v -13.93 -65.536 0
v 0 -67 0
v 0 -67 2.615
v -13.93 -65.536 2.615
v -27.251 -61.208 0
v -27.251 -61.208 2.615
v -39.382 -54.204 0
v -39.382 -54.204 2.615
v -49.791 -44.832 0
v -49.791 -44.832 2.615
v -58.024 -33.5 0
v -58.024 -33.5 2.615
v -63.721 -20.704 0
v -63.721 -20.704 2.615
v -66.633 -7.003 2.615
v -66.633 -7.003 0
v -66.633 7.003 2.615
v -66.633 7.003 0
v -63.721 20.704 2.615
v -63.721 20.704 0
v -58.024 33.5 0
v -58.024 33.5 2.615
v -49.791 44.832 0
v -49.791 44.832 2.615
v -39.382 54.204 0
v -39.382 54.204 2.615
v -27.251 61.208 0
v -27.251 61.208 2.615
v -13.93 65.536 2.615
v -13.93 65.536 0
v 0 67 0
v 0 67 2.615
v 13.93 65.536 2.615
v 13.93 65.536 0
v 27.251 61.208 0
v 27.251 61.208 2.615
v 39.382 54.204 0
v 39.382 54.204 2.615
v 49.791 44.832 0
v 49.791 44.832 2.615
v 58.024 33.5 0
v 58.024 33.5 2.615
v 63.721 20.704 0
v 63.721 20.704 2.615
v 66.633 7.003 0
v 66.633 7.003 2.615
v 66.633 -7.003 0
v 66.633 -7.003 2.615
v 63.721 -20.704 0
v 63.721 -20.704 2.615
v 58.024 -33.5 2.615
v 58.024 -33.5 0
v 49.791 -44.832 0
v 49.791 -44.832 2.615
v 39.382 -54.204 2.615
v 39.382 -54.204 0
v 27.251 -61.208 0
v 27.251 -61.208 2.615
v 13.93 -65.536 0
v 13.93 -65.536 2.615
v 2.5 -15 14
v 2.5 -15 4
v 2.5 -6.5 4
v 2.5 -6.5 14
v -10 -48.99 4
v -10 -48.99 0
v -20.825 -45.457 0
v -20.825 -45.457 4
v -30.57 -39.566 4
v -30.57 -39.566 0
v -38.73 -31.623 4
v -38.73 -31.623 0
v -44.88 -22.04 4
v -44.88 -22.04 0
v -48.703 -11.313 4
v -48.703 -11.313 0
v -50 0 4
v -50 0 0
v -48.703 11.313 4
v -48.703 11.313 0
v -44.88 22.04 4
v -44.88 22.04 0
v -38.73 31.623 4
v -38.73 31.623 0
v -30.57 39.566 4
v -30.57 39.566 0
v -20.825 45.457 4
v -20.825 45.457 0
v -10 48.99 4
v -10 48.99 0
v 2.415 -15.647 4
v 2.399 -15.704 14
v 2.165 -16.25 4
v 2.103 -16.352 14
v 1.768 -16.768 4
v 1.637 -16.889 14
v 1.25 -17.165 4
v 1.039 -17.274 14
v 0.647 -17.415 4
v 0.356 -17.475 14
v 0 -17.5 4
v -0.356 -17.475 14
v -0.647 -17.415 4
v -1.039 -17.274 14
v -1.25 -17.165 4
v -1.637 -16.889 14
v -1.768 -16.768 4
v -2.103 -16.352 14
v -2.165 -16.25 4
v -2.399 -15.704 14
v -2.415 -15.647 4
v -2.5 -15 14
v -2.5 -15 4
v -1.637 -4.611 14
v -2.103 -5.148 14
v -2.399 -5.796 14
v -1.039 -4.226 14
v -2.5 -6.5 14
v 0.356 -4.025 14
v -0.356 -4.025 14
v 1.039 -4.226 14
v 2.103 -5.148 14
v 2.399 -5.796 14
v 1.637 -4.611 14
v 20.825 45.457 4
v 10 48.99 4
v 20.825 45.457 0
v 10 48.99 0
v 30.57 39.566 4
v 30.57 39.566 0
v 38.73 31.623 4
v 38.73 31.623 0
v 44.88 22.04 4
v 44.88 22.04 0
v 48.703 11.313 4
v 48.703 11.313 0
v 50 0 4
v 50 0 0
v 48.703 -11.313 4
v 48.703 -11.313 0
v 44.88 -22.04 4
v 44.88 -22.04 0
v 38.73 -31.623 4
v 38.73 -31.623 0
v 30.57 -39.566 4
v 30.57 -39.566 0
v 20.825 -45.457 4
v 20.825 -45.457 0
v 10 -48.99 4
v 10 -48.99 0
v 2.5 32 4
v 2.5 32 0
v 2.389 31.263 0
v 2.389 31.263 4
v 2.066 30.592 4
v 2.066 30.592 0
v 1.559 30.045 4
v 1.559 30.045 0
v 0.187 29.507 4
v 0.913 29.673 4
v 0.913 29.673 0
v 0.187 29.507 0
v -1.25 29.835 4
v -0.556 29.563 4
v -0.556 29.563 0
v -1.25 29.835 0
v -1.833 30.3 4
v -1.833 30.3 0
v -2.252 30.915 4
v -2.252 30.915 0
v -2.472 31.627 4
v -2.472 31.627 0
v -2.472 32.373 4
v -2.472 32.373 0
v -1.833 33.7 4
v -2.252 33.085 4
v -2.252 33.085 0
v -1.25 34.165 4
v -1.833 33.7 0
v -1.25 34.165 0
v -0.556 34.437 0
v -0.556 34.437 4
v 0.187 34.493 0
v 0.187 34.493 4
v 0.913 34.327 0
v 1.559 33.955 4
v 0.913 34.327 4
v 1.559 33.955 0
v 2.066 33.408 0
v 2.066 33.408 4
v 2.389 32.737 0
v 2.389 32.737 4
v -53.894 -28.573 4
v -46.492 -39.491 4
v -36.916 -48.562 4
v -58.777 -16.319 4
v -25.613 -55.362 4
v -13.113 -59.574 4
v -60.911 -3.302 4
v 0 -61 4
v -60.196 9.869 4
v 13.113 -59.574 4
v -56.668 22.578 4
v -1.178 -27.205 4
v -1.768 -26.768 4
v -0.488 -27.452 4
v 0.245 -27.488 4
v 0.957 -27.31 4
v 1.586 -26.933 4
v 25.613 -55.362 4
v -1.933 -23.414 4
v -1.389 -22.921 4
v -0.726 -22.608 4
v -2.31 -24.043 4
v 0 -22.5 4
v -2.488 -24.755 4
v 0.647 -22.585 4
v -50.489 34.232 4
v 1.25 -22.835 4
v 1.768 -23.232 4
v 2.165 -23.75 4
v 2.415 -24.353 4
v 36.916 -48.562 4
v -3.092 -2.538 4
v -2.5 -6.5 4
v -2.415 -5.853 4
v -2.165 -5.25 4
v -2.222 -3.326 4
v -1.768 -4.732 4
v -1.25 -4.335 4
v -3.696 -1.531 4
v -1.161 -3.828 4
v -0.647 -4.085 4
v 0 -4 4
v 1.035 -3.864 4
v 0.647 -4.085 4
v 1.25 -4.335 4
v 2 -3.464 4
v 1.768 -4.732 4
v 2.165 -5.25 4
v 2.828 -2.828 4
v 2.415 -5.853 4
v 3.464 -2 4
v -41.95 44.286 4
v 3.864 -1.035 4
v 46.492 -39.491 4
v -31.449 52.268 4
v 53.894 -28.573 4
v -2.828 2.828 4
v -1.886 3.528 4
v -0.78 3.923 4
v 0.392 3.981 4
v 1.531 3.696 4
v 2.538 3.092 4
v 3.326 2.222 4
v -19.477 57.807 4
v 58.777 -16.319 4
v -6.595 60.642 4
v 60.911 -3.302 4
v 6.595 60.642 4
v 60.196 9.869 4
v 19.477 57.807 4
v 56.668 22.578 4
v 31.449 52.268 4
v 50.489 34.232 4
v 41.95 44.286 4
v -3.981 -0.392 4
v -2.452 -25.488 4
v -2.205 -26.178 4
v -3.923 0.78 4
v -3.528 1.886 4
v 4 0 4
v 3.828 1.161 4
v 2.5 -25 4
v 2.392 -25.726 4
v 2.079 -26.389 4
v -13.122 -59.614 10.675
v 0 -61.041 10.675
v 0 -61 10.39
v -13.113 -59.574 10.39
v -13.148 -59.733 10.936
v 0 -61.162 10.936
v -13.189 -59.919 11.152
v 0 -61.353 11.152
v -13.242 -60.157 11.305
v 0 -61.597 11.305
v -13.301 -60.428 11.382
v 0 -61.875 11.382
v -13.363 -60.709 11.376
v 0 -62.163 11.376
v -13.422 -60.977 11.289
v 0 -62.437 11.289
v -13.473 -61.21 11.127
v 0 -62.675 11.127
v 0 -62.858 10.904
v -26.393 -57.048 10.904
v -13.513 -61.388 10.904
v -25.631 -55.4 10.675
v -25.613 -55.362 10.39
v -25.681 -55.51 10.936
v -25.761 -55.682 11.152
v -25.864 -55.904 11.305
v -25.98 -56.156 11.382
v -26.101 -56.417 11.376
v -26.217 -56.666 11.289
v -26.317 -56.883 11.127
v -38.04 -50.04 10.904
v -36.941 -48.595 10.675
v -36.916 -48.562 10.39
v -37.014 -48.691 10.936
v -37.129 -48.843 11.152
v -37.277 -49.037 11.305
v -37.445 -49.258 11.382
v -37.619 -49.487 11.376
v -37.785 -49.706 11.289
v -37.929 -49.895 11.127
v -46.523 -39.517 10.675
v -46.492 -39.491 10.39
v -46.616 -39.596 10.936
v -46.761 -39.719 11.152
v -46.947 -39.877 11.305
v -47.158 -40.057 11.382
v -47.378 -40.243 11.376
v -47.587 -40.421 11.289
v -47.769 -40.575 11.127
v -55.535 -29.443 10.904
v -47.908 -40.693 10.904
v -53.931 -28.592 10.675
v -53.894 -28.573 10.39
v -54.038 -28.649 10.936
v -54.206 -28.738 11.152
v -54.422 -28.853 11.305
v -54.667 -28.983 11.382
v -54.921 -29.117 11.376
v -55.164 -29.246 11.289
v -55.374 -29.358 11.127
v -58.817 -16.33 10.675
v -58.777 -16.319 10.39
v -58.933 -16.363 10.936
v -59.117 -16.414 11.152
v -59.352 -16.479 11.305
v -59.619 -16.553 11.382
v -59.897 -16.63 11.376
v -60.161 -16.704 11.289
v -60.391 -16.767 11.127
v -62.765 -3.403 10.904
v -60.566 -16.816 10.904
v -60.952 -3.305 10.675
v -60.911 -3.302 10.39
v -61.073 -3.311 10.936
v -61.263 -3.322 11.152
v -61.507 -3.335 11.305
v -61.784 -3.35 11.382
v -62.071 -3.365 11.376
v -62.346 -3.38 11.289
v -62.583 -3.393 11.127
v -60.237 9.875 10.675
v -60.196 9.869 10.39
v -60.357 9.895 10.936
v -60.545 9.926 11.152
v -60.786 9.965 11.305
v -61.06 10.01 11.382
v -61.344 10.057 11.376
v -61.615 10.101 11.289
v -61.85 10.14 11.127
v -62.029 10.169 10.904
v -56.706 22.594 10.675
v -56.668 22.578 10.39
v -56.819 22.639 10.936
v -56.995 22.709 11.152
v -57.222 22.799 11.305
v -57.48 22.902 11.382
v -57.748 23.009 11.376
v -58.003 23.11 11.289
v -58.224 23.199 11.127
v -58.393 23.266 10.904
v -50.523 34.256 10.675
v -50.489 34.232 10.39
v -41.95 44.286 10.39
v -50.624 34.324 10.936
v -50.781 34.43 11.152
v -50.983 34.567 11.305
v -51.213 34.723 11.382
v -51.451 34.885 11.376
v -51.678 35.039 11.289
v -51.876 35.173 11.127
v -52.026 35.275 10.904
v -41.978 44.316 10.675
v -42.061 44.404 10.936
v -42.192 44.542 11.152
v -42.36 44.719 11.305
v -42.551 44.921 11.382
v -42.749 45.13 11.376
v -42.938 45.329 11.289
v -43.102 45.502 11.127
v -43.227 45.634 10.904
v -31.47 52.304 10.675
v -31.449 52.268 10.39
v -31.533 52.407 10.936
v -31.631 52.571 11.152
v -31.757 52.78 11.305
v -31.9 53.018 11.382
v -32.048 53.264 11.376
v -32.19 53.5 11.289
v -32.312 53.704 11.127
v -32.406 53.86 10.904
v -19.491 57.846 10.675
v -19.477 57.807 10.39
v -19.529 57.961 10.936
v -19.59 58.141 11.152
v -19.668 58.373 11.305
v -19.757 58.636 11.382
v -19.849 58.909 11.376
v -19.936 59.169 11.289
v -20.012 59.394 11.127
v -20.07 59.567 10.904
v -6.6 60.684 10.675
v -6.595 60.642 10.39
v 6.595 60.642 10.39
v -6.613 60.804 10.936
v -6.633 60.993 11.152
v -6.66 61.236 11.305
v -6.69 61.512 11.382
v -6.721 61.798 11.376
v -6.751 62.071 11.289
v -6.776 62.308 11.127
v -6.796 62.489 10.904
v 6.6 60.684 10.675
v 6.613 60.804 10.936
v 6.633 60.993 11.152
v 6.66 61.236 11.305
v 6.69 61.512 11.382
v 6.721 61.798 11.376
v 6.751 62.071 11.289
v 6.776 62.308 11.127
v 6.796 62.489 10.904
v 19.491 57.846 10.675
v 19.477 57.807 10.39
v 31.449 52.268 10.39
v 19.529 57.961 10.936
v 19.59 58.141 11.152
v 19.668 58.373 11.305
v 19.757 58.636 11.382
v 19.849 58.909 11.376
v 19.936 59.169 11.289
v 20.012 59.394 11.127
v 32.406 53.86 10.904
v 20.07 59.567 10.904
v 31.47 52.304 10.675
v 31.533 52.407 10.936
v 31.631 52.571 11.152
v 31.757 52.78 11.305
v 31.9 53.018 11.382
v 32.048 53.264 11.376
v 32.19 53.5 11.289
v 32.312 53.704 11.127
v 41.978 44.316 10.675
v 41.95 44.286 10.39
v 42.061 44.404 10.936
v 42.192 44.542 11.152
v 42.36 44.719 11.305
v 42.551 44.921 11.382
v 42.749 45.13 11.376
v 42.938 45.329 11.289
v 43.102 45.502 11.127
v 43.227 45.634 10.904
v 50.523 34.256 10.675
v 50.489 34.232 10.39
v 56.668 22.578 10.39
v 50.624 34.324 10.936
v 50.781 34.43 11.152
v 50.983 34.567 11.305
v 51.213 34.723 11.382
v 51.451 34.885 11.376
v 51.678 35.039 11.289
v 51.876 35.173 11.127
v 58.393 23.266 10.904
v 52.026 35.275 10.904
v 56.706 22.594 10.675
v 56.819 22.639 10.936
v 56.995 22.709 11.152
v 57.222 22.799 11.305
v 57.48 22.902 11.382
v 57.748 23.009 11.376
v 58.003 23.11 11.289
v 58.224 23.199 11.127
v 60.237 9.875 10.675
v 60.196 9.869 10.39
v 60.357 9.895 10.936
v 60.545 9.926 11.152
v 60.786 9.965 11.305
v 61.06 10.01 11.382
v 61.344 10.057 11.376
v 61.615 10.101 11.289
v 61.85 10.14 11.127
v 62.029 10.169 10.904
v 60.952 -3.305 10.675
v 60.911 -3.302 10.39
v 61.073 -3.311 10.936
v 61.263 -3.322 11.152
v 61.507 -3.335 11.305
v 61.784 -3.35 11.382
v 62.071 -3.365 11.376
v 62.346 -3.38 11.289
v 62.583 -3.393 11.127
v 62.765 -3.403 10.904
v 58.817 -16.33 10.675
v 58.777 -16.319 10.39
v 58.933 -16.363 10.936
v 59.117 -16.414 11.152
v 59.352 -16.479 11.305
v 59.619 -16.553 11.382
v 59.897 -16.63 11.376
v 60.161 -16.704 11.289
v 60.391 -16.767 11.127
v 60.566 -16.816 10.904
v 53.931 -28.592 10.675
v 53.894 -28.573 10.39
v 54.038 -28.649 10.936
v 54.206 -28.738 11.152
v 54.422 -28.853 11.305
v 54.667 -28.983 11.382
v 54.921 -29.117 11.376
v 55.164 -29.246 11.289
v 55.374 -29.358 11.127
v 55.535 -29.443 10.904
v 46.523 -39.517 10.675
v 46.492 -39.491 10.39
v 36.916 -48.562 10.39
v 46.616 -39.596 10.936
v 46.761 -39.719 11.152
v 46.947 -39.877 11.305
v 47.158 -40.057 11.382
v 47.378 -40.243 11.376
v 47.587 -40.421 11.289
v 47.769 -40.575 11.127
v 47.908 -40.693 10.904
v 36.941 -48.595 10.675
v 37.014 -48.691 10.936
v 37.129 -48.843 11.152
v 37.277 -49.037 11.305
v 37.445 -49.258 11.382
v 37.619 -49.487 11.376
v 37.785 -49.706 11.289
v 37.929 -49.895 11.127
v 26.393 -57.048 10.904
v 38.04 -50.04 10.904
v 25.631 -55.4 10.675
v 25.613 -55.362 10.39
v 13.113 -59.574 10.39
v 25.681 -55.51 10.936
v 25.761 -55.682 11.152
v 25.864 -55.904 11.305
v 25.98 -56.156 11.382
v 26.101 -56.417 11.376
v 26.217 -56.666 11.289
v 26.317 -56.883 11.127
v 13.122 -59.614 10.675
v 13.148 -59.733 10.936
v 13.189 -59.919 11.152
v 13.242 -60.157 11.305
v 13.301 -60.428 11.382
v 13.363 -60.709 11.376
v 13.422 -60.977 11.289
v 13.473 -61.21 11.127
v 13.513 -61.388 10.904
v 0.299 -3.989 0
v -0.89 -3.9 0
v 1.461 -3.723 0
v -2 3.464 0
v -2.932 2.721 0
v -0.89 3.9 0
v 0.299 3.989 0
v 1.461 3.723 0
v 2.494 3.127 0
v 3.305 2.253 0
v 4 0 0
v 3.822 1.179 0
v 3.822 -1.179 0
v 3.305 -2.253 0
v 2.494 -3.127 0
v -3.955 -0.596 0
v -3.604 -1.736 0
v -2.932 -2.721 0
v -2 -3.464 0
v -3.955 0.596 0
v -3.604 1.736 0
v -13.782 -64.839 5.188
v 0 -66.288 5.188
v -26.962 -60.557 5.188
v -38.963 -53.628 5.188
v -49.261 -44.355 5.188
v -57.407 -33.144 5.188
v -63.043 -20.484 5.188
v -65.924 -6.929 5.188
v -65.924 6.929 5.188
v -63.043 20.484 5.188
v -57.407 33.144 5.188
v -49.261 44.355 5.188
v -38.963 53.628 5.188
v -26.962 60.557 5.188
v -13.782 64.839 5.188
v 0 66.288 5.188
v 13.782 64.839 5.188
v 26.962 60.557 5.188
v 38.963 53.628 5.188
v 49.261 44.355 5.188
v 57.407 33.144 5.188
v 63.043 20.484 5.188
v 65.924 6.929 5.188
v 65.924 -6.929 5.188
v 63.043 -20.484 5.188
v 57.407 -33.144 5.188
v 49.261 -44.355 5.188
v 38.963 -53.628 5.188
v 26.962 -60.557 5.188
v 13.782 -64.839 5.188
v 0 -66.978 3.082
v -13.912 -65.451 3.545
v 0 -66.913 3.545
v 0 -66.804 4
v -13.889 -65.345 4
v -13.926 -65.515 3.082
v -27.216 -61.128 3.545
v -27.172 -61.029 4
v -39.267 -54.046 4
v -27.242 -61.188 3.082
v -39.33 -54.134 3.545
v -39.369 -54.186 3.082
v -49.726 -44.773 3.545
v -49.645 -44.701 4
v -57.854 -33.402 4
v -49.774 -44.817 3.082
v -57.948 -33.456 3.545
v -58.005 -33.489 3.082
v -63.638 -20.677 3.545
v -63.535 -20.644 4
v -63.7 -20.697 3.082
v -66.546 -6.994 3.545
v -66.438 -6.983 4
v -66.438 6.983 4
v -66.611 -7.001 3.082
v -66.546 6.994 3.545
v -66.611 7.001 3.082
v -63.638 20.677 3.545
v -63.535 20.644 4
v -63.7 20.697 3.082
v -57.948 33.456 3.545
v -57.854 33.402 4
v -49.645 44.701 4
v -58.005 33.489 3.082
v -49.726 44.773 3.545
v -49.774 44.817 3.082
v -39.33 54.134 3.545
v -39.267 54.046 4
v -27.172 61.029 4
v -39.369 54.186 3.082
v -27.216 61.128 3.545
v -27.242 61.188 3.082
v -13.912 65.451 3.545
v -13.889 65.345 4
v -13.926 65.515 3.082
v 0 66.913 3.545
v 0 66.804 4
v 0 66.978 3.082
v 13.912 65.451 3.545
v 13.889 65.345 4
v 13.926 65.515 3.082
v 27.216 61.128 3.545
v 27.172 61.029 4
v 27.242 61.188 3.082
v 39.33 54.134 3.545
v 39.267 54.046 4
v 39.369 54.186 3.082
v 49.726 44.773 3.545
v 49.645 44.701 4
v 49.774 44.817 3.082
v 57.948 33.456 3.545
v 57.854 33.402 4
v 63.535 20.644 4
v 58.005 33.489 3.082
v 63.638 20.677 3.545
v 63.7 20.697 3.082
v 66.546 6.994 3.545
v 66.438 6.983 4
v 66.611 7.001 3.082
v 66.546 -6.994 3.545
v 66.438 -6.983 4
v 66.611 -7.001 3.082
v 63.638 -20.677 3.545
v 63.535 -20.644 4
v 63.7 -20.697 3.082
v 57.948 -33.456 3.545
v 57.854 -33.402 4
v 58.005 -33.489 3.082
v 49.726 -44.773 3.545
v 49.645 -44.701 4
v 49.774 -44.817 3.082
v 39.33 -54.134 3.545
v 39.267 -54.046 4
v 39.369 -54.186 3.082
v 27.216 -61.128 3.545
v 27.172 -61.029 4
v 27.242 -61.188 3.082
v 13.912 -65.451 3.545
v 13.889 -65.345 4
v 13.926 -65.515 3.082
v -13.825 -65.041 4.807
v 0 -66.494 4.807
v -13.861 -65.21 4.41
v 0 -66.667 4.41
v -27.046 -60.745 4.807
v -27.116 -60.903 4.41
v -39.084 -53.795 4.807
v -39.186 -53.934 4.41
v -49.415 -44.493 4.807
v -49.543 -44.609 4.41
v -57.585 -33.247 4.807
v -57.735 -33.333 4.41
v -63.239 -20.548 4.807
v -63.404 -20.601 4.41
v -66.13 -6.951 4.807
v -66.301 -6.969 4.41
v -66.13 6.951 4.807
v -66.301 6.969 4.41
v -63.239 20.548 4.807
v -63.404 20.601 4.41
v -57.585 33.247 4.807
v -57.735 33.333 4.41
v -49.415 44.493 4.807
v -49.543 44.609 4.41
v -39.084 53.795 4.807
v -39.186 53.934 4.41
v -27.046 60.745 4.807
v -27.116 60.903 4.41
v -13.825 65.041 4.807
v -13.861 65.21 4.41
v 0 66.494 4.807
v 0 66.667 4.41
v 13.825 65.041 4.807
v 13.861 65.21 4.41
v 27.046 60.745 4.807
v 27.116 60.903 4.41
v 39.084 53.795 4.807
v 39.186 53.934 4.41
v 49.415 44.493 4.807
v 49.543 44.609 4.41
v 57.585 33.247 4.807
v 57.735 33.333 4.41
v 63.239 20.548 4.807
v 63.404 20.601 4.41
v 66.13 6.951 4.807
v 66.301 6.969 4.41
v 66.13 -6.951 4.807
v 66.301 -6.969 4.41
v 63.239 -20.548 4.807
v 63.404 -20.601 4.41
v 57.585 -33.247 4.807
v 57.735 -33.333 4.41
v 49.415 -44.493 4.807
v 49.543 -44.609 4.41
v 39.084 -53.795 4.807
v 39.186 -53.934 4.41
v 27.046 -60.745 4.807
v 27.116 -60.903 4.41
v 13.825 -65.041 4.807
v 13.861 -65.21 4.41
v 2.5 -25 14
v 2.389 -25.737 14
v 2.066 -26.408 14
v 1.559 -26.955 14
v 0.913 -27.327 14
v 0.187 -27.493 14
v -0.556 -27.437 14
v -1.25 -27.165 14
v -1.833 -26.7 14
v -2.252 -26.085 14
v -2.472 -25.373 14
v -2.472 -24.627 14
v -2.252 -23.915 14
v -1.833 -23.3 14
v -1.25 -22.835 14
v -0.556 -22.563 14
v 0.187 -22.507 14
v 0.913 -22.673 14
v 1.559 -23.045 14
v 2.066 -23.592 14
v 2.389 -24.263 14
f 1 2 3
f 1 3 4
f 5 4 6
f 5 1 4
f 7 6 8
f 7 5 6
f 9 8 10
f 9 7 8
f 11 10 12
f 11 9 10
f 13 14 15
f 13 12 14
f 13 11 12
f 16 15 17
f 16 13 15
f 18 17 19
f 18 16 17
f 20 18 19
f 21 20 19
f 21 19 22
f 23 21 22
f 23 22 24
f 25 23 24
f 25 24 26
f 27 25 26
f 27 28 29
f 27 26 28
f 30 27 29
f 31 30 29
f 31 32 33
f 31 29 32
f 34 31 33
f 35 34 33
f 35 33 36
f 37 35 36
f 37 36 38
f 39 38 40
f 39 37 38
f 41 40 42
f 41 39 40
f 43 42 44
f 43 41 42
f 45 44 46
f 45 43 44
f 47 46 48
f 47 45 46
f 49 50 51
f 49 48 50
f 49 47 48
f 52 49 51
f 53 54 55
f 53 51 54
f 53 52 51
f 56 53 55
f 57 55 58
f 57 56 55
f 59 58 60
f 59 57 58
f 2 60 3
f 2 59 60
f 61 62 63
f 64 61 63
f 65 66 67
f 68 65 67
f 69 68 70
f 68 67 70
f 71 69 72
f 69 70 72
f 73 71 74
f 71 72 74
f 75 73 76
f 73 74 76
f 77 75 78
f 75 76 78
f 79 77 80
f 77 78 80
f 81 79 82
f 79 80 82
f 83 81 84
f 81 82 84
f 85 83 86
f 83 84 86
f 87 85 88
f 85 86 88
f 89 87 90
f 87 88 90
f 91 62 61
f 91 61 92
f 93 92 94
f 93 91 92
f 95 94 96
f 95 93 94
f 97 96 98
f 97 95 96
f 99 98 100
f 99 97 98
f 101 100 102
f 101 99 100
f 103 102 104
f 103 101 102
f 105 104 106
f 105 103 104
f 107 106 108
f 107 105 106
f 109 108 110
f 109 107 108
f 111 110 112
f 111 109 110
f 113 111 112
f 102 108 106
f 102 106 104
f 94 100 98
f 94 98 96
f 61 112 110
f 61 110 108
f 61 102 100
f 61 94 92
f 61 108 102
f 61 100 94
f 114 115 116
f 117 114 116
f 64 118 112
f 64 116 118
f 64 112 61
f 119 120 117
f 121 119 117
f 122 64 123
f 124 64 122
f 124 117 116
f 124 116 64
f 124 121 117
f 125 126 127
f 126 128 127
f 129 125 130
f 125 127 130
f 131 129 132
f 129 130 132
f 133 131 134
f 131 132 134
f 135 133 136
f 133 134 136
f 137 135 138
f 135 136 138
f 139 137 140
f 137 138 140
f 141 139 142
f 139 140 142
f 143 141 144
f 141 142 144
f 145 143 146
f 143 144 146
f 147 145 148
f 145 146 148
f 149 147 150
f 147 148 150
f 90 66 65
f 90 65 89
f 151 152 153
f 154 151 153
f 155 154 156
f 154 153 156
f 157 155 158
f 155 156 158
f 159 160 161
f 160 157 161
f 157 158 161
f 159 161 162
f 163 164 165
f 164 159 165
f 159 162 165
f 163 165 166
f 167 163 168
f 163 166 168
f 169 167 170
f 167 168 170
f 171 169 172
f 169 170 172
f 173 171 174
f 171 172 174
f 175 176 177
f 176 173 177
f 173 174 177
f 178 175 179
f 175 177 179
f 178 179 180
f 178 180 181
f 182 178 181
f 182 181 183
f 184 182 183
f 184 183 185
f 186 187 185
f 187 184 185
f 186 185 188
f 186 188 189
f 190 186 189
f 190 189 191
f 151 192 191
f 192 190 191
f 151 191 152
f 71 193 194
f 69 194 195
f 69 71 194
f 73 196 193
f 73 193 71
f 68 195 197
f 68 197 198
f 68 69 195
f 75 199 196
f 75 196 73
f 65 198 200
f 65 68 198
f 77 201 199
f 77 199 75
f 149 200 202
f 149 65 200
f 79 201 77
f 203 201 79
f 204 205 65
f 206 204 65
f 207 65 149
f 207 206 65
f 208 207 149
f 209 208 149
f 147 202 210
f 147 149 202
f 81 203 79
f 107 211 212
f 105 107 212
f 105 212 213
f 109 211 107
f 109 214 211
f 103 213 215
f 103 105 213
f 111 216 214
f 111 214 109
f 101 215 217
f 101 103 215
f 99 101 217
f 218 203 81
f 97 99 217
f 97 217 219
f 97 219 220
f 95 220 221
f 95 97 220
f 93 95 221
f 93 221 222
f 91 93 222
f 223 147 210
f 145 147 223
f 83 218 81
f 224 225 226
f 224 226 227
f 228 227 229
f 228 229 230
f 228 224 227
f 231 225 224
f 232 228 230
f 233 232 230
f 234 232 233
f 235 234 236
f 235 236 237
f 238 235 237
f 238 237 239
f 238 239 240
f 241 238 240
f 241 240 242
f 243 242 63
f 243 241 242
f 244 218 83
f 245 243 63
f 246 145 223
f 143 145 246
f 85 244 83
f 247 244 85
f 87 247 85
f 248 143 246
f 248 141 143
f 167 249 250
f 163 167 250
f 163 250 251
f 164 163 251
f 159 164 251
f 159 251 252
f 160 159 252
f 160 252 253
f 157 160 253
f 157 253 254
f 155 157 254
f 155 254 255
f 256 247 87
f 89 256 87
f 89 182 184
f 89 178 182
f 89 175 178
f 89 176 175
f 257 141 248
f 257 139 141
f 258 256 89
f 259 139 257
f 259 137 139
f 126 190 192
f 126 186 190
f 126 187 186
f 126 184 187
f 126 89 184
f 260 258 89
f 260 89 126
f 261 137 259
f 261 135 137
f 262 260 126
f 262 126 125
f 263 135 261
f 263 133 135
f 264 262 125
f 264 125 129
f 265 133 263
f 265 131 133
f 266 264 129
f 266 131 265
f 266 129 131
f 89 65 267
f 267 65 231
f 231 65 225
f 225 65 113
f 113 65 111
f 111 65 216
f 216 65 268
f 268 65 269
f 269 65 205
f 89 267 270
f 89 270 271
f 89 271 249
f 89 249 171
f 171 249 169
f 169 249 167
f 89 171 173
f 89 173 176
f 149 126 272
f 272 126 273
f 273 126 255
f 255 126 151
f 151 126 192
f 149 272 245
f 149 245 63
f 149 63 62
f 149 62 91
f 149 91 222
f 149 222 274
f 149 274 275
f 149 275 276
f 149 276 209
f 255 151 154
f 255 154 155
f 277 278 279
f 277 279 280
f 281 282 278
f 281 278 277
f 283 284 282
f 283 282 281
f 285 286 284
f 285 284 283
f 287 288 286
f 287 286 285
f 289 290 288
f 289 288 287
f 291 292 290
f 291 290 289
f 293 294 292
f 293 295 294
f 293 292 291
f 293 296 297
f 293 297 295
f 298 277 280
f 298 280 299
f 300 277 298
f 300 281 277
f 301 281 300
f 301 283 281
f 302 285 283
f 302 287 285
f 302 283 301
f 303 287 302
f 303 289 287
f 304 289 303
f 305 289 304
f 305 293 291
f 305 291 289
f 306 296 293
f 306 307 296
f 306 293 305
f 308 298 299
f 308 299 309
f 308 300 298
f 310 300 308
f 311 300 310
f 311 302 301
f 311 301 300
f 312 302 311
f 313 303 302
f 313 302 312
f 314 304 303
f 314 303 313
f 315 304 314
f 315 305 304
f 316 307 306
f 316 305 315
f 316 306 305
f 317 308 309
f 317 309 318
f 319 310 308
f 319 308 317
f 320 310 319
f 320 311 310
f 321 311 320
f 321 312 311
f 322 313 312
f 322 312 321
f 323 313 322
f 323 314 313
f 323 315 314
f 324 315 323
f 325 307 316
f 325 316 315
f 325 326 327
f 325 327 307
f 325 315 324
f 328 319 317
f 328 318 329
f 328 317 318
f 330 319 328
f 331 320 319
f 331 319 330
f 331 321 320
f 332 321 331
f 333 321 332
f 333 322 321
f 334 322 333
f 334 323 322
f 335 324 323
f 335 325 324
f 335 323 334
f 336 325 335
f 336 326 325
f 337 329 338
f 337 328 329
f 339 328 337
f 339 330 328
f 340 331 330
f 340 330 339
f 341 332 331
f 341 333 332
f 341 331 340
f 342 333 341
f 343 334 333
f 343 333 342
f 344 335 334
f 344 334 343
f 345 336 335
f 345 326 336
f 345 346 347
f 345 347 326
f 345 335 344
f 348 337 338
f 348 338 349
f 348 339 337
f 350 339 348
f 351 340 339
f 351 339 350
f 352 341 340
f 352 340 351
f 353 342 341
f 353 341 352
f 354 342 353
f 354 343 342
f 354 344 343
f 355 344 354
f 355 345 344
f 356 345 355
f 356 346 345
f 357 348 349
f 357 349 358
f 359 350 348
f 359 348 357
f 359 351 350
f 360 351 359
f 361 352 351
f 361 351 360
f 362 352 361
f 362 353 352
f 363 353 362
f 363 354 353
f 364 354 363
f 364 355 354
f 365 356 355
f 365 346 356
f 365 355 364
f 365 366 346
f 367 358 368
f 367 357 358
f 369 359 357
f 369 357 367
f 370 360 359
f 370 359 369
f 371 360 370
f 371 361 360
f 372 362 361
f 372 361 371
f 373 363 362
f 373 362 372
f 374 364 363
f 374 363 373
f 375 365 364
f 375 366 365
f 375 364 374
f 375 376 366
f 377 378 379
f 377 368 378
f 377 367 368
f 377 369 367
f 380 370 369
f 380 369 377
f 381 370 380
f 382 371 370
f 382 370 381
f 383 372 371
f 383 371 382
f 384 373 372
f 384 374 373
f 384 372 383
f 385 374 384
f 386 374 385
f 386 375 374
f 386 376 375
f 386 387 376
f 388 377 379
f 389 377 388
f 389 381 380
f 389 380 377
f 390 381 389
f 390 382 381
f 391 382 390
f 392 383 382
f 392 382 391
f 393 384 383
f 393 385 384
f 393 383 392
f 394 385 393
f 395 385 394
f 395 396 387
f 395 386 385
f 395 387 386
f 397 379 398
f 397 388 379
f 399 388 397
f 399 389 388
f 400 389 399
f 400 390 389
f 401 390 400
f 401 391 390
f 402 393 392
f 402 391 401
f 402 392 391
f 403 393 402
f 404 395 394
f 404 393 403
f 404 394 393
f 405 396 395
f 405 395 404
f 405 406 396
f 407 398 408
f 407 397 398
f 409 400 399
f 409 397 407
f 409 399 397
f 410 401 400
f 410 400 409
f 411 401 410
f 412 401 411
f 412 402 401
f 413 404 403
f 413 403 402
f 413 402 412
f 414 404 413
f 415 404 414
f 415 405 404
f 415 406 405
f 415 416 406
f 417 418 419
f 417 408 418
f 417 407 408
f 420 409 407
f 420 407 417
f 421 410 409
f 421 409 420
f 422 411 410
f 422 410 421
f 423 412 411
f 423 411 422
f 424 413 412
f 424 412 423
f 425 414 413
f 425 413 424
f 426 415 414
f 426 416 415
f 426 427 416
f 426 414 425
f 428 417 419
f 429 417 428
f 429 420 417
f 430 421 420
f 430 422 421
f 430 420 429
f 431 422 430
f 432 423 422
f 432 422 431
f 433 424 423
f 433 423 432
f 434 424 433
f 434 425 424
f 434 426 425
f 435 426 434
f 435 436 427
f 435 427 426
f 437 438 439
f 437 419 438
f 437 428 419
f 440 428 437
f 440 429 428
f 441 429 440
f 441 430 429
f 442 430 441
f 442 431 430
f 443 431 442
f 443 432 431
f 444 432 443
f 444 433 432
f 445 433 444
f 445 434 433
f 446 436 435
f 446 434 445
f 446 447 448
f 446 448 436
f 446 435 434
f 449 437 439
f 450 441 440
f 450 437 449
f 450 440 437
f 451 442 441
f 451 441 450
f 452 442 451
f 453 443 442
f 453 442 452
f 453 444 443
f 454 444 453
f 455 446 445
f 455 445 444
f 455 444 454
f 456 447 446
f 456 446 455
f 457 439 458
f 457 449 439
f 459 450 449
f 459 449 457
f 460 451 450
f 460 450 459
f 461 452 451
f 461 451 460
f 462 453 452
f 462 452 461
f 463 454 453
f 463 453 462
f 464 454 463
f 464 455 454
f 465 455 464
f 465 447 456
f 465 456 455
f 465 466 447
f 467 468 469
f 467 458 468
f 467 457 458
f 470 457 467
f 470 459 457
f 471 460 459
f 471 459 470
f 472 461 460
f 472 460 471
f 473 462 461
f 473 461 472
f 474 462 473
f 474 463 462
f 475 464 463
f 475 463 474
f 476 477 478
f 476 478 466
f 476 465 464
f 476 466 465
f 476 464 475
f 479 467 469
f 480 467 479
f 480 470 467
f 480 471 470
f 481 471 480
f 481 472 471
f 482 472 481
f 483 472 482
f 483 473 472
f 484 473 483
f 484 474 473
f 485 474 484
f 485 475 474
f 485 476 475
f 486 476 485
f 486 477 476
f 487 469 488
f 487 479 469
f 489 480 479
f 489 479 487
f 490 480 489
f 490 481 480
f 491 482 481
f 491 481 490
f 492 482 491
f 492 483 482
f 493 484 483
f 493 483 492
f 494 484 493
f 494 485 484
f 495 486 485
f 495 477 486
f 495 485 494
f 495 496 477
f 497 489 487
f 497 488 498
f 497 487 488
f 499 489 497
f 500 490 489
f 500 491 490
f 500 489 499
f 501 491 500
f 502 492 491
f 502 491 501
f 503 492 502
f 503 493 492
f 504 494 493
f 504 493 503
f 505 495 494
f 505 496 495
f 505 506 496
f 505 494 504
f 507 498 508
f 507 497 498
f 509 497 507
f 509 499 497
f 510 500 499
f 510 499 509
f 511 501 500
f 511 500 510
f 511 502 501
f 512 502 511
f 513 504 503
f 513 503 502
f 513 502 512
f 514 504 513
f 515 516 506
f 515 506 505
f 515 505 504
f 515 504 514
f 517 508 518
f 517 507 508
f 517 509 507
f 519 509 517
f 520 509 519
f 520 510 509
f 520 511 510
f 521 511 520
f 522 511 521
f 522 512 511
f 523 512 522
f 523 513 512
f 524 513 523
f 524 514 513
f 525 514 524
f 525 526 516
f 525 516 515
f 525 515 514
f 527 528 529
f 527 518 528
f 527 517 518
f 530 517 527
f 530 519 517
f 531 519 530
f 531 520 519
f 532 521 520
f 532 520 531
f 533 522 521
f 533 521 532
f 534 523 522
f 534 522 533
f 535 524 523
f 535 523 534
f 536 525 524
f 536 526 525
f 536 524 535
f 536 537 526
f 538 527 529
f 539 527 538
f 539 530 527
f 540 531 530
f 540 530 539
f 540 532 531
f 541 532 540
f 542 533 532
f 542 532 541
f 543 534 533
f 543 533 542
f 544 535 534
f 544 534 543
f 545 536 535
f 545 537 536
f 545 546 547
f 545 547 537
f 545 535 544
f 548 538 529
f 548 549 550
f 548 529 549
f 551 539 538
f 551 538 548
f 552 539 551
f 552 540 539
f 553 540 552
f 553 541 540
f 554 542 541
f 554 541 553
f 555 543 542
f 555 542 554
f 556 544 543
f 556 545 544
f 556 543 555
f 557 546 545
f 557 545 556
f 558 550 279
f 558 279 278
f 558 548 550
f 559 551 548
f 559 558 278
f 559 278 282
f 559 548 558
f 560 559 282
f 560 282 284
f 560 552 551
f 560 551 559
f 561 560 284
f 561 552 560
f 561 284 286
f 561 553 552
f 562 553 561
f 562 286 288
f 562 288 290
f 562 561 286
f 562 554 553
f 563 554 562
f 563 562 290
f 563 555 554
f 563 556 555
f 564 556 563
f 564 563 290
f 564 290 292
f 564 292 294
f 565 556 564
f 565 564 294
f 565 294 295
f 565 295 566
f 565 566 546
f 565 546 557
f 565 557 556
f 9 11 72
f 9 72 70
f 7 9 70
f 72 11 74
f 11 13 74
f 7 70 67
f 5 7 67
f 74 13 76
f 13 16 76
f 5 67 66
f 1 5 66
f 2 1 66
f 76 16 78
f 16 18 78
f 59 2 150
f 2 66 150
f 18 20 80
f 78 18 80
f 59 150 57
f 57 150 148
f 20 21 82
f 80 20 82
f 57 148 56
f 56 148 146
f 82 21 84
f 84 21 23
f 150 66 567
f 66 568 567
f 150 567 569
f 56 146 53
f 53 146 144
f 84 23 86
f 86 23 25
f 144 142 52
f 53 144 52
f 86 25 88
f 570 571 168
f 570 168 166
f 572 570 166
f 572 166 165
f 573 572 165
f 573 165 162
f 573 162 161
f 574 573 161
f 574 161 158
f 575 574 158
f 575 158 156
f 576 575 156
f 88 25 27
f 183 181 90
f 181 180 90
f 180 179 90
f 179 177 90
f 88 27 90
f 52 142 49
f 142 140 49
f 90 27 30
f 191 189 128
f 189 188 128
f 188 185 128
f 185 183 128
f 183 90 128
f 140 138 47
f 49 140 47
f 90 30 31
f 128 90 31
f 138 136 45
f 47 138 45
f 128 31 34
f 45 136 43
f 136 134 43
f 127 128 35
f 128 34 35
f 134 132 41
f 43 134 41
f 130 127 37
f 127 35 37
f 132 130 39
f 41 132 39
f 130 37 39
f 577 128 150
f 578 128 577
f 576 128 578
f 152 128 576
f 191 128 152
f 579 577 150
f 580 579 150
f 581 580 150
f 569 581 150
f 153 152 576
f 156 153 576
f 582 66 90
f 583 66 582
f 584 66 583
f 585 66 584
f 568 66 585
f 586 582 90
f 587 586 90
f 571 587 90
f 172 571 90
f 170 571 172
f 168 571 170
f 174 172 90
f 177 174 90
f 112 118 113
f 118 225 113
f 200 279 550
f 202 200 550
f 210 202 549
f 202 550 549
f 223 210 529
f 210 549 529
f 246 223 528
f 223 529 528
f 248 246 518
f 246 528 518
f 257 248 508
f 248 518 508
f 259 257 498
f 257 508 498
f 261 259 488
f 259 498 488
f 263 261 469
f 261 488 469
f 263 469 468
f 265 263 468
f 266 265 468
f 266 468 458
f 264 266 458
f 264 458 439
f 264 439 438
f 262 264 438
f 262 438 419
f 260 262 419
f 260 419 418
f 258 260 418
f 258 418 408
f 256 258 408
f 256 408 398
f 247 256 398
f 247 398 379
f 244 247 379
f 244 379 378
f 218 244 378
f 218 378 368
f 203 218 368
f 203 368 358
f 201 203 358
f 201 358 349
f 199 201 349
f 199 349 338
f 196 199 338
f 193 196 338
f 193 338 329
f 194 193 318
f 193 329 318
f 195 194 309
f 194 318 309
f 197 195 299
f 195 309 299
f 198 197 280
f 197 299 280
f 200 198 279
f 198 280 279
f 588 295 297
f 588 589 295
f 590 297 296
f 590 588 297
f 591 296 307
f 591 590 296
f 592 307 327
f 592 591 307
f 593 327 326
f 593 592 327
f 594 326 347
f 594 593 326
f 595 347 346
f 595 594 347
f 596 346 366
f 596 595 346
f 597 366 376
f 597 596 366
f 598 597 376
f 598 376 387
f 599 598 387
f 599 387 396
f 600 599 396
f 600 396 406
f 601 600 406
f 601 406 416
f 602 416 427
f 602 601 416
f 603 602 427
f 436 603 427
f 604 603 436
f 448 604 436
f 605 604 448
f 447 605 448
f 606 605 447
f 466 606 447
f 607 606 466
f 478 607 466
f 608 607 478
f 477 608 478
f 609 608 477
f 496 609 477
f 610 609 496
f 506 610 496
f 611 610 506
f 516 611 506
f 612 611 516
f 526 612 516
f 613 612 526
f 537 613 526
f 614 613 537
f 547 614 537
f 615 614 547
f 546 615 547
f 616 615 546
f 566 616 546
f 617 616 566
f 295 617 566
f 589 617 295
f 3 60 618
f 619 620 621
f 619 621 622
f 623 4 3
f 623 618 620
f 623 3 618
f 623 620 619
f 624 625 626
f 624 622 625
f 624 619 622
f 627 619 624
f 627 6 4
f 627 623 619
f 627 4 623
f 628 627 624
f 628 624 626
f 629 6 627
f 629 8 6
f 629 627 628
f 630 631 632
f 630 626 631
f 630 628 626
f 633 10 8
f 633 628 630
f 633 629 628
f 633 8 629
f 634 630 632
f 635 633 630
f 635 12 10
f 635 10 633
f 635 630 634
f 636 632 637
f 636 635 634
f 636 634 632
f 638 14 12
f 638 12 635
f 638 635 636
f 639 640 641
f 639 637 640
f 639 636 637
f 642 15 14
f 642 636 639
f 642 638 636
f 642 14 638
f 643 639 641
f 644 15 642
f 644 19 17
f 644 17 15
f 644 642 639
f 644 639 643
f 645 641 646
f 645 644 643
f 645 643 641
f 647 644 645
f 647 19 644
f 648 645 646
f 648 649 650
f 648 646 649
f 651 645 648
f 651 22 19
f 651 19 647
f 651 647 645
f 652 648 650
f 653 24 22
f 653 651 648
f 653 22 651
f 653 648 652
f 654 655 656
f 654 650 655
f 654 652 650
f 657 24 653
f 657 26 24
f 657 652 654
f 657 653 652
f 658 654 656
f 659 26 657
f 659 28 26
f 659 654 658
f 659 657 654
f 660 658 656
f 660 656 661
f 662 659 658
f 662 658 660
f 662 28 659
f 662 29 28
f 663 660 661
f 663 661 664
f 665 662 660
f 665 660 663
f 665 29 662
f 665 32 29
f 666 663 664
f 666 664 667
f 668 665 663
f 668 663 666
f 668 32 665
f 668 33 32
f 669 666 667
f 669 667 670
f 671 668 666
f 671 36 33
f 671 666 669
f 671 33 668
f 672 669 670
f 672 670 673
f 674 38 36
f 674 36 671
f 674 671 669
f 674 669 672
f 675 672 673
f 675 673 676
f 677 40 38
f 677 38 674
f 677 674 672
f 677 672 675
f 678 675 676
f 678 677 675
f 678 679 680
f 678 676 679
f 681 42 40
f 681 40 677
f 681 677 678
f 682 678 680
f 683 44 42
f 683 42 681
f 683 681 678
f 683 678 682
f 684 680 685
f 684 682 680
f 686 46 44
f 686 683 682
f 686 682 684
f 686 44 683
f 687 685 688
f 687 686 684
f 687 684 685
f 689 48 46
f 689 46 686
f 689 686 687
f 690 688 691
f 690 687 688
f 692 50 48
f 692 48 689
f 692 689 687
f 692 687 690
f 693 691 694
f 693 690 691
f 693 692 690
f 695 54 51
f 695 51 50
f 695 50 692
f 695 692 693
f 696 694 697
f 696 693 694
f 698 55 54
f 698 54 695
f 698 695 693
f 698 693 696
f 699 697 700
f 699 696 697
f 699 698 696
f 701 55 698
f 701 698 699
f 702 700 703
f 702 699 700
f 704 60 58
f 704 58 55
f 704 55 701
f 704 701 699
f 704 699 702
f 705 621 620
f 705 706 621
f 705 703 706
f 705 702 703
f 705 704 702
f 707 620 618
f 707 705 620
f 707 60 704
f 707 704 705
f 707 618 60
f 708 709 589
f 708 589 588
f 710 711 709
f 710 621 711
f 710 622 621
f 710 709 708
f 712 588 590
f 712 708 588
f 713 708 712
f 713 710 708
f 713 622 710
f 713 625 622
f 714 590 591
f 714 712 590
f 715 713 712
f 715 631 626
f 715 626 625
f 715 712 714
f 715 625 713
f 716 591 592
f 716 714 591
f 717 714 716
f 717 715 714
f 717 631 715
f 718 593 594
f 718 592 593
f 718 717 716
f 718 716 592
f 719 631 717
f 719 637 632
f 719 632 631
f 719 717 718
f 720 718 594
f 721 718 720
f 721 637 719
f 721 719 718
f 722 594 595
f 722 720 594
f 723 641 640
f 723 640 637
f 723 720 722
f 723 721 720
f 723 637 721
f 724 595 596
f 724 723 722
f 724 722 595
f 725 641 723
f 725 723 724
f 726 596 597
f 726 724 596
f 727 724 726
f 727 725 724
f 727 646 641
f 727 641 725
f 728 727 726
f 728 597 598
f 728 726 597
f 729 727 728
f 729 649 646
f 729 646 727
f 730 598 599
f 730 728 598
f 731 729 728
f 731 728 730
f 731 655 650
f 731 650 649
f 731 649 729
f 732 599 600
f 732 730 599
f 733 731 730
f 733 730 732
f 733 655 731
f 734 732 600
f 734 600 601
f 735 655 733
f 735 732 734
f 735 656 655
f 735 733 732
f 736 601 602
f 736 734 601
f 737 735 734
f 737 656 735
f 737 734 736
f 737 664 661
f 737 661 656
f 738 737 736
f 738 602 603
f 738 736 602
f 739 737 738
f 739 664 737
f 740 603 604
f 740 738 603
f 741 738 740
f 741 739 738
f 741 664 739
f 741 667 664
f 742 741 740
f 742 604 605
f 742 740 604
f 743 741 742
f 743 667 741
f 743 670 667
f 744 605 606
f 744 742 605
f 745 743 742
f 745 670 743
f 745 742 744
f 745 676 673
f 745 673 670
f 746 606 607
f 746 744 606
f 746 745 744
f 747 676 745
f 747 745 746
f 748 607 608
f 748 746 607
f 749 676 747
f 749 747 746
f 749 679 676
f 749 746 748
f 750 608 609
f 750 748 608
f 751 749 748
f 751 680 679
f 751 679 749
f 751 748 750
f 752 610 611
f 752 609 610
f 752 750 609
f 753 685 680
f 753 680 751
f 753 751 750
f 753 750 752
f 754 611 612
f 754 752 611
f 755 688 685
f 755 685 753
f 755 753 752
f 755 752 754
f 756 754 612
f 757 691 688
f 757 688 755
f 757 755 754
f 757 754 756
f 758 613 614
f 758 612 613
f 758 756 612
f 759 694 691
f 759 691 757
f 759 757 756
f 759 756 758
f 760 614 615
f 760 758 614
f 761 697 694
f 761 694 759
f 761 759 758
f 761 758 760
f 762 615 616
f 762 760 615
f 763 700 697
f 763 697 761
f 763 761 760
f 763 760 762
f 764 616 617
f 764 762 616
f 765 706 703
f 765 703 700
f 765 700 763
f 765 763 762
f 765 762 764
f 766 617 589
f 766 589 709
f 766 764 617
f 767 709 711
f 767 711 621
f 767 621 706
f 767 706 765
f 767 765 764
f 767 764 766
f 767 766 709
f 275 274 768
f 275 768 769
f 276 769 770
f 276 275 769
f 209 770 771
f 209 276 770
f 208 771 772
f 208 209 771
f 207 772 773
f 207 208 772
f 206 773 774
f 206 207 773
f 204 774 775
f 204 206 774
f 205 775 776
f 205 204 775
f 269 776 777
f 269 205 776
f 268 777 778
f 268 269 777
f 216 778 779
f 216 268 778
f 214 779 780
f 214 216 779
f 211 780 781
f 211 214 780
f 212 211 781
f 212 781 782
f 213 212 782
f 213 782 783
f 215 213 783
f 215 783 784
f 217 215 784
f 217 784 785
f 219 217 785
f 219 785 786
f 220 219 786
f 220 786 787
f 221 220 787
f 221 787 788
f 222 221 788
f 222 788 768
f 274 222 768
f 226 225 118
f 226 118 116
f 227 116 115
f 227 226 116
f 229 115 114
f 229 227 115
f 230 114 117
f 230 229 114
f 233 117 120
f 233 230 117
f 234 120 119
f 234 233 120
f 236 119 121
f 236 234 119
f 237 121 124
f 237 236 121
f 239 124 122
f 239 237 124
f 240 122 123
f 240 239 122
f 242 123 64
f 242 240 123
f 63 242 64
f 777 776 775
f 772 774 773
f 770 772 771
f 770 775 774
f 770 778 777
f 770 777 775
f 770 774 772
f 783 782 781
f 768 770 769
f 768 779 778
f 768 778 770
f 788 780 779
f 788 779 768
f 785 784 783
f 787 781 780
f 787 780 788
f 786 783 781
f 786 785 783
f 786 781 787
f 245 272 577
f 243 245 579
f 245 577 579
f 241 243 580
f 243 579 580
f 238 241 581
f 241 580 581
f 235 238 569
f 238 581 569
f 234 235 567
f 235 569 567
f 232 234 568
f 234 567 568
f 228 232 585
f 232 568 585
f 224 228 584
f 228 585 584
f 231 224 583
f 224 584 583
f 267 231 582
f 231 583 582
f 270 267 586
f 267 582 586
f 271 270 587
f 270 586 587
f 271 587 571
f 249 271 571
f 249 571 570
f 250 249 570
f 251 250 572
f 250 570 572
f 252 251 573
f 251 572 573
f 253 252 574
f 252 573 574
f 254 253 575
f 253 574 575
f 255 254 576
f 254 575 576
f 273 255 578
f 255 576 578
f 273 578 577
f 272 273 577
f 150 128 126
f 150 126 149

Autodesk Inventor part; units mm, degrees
ref_plane "YZ Plane" through (0, 0, 0) normal (1, 0, 0) x (0, 1, 0)
ref_plane "XZ Plane" through (0, 0, 0) normal (0, 1, 0) x (-1, 0, 0)
ref_plane "XY Plane" through (0, 0, 0) normal (0, 0, 1) x (1, 0, 0)
sketch "Sketch1" plane through (0, 0, 0) normal (0, 0, 1) x (1, 0, 0)
  circle A0 centre (0, 0) radius 61
  arc A1 (7.0788, 15.7662) -> (7.8803, 16.1398) centre (0, 32) ccw
  circle A2 centre (0, 0) radius 61
  circle A3 centre (0, 32) radius 2.5
  circle A4 centre (0, 0) radius 50
  circle A5 centre (0, 0) radius 57.5 construction
  circle A6 centre (0, 0) radius 57 construction
  circle A7 centre (0, 0) radius 7.5 construction
  circle A8 centre (0, 32) radius 23 construction
  circle A9 centre (0, 0) radius 45 construction
  circle A10 centre (0, 32) radius 27.5 construction
  line L0 (-5.8547, -4.6875) -> (-21.4672, 14.8125) construction
  line L1 (5.8547, -4.6875) -> (21.4672, 14.8125) construction
  line L2 (0, 0) -> (0, 32) construction
  line L3 (7.5, 44.3706) -> (7.5, -44.3706) construction
  line L4 (-7.5, 44.3706) -> (-7.5, -44.3706) construction
  circle A11 centre (0, 0) radius 2.5
  line L5 (0, 0) -> (0, -15) construction
  circle A12 centre (0, -15) radius 2.5
  line L6 (-2.5, 0) -> (-2.5, -15)
  line L7 (2.5, -15) -> (2.5, 0)
  circle A13 centre (0, -7.5) radius 10 construction
  line L8 (-10, -7.5) -> (-10, 60.1747)
  line L9 (10, -7.5) -> (10, 60.1747)
  line L10 (-10, -7.5) -> (-10, -60.1747)
  line L11 (10, -7.5) -> (10, -60.1747)
  circle A14 centre (0, 0) radius 4
  circle A15 centre (0, -6.5) radius 2.5
  line L12 (0, -15) -> (0, -25)
  circle A16 centre (0, -25) radius 2.5
  point P0 (35.0374, 41.2549)
  point P1 (15.3046, 2.7982)
  point P2 (-19.4282, 41.2549)
  point P3 (0.3046, 2.7982)
  point P4 (25.4129, 52.2276)
  point P5 (-9.8037, 52.2276)
  point P6 (-10, 48.9898)
  point P7 (-10, -48.9898)
  point P8 (10, 48.9898)
  point P9 (10, -48.9898)
  point P10 (-2.5, -6.5)
  point P11 (2.5, -6.5)
  point P12 (-2.5, -3.1225)
  point P13 (2.5, -3.1225)
  dimension "d0" = 5
  dimension "d1" = 100
  dimension "d2" = 115
  dimension "d3" = 15
  dimension "d4" = 46
  dimension "d5" = 90
  dimension "d6" = 55
  dimension "d7" = 32
  dimension "d8" = 5
  dimension "d9" = 15
  dimension "d10" = 5
  dimension "d23" = 122
  dimension "d26" = 8
  dimension "d28" = 10
  dimension "d29" = 5
extrude "Extrusion1" add sketch "Sketch1" along normal blind 4 contours A0 L11 A4 L9 | L9 A4 L8 A0 | A0 L10 A4 L11 | L8 A4 L10 A0 | L9 L11 A4 L10 L8 | A16 | L7 A15 A14 | A14 A15 L6 | A15 | L7 A12 L6 A15 | A12
extrude "Extrusion2" add sketch "Sketch1" along normal blind 14 contours A16 | A15 | L7 A12 L6 A15 | A12
ref_plane "Work Plane1" through (0, -48.9898, 0) normal (1, 0, 0) x (0, 0, -1)
sketch "Sketch2" plane through (0, -48.9898, 0) normal (1, 0, 0) x (0, 0, -1)
  line L0 (-4, 109.9898) -> (-4, -12.0102) projected
  line L1 (0, 109.9898) -> (0, -12.0102) projected
  line L2 (0, 109.9898) -> (0, -12.0102) projected
  line L3 (0, -12.0102) -> (-10.3897, -12.0102)
  line L4 (-14, 33.9898) -> (-14, 31.4898) projected
  line L5 (0, -12.0102) -> (-4, -12.0102)
  line L6 (-4, -12.0102) -> (-4, -18.0102)
  line L7 (-2.6151, -18.0102) -> (0, -18.0102)
  line L8 (0, -18.0102) -> (0, -12.0102)
  line L9 (-5.1876, -17.2977) -> (-10.9042, -13.8677)
  arc A0 (-10.3897, -12.0102) -> (-10.9042, -13.8677) centre (-10.3897, -13.0102) ccw
  arc A1 (-5.1876, -17.2977) -> (-2.6151, -18.0102) centre (-2.6151, -13.0102) ccw
  line L10 (-0.0174, 48.9898) -> (-14.0174, 48.9898) construction
  line L11 (-0.0174, 48.9898) -> (13.9826, 48.9898) construction
  point P0 (0, 48.9898)
  point P1 (-14, -12.0102)
  dimension "d15" = 14
  dimension "d16" = 4
  dimension "d17" = 6
  dimension "d18" = 1
  dimension "d19" = 5
  dimension "d20" = 14
  dimension "d21" = 180
revolve "Revolution1" add sketch "Sketch2" angle 360 about axis through (0, 0, 0.0174) along (0, 0, 1)
properties part number "Gear Holder 2"
